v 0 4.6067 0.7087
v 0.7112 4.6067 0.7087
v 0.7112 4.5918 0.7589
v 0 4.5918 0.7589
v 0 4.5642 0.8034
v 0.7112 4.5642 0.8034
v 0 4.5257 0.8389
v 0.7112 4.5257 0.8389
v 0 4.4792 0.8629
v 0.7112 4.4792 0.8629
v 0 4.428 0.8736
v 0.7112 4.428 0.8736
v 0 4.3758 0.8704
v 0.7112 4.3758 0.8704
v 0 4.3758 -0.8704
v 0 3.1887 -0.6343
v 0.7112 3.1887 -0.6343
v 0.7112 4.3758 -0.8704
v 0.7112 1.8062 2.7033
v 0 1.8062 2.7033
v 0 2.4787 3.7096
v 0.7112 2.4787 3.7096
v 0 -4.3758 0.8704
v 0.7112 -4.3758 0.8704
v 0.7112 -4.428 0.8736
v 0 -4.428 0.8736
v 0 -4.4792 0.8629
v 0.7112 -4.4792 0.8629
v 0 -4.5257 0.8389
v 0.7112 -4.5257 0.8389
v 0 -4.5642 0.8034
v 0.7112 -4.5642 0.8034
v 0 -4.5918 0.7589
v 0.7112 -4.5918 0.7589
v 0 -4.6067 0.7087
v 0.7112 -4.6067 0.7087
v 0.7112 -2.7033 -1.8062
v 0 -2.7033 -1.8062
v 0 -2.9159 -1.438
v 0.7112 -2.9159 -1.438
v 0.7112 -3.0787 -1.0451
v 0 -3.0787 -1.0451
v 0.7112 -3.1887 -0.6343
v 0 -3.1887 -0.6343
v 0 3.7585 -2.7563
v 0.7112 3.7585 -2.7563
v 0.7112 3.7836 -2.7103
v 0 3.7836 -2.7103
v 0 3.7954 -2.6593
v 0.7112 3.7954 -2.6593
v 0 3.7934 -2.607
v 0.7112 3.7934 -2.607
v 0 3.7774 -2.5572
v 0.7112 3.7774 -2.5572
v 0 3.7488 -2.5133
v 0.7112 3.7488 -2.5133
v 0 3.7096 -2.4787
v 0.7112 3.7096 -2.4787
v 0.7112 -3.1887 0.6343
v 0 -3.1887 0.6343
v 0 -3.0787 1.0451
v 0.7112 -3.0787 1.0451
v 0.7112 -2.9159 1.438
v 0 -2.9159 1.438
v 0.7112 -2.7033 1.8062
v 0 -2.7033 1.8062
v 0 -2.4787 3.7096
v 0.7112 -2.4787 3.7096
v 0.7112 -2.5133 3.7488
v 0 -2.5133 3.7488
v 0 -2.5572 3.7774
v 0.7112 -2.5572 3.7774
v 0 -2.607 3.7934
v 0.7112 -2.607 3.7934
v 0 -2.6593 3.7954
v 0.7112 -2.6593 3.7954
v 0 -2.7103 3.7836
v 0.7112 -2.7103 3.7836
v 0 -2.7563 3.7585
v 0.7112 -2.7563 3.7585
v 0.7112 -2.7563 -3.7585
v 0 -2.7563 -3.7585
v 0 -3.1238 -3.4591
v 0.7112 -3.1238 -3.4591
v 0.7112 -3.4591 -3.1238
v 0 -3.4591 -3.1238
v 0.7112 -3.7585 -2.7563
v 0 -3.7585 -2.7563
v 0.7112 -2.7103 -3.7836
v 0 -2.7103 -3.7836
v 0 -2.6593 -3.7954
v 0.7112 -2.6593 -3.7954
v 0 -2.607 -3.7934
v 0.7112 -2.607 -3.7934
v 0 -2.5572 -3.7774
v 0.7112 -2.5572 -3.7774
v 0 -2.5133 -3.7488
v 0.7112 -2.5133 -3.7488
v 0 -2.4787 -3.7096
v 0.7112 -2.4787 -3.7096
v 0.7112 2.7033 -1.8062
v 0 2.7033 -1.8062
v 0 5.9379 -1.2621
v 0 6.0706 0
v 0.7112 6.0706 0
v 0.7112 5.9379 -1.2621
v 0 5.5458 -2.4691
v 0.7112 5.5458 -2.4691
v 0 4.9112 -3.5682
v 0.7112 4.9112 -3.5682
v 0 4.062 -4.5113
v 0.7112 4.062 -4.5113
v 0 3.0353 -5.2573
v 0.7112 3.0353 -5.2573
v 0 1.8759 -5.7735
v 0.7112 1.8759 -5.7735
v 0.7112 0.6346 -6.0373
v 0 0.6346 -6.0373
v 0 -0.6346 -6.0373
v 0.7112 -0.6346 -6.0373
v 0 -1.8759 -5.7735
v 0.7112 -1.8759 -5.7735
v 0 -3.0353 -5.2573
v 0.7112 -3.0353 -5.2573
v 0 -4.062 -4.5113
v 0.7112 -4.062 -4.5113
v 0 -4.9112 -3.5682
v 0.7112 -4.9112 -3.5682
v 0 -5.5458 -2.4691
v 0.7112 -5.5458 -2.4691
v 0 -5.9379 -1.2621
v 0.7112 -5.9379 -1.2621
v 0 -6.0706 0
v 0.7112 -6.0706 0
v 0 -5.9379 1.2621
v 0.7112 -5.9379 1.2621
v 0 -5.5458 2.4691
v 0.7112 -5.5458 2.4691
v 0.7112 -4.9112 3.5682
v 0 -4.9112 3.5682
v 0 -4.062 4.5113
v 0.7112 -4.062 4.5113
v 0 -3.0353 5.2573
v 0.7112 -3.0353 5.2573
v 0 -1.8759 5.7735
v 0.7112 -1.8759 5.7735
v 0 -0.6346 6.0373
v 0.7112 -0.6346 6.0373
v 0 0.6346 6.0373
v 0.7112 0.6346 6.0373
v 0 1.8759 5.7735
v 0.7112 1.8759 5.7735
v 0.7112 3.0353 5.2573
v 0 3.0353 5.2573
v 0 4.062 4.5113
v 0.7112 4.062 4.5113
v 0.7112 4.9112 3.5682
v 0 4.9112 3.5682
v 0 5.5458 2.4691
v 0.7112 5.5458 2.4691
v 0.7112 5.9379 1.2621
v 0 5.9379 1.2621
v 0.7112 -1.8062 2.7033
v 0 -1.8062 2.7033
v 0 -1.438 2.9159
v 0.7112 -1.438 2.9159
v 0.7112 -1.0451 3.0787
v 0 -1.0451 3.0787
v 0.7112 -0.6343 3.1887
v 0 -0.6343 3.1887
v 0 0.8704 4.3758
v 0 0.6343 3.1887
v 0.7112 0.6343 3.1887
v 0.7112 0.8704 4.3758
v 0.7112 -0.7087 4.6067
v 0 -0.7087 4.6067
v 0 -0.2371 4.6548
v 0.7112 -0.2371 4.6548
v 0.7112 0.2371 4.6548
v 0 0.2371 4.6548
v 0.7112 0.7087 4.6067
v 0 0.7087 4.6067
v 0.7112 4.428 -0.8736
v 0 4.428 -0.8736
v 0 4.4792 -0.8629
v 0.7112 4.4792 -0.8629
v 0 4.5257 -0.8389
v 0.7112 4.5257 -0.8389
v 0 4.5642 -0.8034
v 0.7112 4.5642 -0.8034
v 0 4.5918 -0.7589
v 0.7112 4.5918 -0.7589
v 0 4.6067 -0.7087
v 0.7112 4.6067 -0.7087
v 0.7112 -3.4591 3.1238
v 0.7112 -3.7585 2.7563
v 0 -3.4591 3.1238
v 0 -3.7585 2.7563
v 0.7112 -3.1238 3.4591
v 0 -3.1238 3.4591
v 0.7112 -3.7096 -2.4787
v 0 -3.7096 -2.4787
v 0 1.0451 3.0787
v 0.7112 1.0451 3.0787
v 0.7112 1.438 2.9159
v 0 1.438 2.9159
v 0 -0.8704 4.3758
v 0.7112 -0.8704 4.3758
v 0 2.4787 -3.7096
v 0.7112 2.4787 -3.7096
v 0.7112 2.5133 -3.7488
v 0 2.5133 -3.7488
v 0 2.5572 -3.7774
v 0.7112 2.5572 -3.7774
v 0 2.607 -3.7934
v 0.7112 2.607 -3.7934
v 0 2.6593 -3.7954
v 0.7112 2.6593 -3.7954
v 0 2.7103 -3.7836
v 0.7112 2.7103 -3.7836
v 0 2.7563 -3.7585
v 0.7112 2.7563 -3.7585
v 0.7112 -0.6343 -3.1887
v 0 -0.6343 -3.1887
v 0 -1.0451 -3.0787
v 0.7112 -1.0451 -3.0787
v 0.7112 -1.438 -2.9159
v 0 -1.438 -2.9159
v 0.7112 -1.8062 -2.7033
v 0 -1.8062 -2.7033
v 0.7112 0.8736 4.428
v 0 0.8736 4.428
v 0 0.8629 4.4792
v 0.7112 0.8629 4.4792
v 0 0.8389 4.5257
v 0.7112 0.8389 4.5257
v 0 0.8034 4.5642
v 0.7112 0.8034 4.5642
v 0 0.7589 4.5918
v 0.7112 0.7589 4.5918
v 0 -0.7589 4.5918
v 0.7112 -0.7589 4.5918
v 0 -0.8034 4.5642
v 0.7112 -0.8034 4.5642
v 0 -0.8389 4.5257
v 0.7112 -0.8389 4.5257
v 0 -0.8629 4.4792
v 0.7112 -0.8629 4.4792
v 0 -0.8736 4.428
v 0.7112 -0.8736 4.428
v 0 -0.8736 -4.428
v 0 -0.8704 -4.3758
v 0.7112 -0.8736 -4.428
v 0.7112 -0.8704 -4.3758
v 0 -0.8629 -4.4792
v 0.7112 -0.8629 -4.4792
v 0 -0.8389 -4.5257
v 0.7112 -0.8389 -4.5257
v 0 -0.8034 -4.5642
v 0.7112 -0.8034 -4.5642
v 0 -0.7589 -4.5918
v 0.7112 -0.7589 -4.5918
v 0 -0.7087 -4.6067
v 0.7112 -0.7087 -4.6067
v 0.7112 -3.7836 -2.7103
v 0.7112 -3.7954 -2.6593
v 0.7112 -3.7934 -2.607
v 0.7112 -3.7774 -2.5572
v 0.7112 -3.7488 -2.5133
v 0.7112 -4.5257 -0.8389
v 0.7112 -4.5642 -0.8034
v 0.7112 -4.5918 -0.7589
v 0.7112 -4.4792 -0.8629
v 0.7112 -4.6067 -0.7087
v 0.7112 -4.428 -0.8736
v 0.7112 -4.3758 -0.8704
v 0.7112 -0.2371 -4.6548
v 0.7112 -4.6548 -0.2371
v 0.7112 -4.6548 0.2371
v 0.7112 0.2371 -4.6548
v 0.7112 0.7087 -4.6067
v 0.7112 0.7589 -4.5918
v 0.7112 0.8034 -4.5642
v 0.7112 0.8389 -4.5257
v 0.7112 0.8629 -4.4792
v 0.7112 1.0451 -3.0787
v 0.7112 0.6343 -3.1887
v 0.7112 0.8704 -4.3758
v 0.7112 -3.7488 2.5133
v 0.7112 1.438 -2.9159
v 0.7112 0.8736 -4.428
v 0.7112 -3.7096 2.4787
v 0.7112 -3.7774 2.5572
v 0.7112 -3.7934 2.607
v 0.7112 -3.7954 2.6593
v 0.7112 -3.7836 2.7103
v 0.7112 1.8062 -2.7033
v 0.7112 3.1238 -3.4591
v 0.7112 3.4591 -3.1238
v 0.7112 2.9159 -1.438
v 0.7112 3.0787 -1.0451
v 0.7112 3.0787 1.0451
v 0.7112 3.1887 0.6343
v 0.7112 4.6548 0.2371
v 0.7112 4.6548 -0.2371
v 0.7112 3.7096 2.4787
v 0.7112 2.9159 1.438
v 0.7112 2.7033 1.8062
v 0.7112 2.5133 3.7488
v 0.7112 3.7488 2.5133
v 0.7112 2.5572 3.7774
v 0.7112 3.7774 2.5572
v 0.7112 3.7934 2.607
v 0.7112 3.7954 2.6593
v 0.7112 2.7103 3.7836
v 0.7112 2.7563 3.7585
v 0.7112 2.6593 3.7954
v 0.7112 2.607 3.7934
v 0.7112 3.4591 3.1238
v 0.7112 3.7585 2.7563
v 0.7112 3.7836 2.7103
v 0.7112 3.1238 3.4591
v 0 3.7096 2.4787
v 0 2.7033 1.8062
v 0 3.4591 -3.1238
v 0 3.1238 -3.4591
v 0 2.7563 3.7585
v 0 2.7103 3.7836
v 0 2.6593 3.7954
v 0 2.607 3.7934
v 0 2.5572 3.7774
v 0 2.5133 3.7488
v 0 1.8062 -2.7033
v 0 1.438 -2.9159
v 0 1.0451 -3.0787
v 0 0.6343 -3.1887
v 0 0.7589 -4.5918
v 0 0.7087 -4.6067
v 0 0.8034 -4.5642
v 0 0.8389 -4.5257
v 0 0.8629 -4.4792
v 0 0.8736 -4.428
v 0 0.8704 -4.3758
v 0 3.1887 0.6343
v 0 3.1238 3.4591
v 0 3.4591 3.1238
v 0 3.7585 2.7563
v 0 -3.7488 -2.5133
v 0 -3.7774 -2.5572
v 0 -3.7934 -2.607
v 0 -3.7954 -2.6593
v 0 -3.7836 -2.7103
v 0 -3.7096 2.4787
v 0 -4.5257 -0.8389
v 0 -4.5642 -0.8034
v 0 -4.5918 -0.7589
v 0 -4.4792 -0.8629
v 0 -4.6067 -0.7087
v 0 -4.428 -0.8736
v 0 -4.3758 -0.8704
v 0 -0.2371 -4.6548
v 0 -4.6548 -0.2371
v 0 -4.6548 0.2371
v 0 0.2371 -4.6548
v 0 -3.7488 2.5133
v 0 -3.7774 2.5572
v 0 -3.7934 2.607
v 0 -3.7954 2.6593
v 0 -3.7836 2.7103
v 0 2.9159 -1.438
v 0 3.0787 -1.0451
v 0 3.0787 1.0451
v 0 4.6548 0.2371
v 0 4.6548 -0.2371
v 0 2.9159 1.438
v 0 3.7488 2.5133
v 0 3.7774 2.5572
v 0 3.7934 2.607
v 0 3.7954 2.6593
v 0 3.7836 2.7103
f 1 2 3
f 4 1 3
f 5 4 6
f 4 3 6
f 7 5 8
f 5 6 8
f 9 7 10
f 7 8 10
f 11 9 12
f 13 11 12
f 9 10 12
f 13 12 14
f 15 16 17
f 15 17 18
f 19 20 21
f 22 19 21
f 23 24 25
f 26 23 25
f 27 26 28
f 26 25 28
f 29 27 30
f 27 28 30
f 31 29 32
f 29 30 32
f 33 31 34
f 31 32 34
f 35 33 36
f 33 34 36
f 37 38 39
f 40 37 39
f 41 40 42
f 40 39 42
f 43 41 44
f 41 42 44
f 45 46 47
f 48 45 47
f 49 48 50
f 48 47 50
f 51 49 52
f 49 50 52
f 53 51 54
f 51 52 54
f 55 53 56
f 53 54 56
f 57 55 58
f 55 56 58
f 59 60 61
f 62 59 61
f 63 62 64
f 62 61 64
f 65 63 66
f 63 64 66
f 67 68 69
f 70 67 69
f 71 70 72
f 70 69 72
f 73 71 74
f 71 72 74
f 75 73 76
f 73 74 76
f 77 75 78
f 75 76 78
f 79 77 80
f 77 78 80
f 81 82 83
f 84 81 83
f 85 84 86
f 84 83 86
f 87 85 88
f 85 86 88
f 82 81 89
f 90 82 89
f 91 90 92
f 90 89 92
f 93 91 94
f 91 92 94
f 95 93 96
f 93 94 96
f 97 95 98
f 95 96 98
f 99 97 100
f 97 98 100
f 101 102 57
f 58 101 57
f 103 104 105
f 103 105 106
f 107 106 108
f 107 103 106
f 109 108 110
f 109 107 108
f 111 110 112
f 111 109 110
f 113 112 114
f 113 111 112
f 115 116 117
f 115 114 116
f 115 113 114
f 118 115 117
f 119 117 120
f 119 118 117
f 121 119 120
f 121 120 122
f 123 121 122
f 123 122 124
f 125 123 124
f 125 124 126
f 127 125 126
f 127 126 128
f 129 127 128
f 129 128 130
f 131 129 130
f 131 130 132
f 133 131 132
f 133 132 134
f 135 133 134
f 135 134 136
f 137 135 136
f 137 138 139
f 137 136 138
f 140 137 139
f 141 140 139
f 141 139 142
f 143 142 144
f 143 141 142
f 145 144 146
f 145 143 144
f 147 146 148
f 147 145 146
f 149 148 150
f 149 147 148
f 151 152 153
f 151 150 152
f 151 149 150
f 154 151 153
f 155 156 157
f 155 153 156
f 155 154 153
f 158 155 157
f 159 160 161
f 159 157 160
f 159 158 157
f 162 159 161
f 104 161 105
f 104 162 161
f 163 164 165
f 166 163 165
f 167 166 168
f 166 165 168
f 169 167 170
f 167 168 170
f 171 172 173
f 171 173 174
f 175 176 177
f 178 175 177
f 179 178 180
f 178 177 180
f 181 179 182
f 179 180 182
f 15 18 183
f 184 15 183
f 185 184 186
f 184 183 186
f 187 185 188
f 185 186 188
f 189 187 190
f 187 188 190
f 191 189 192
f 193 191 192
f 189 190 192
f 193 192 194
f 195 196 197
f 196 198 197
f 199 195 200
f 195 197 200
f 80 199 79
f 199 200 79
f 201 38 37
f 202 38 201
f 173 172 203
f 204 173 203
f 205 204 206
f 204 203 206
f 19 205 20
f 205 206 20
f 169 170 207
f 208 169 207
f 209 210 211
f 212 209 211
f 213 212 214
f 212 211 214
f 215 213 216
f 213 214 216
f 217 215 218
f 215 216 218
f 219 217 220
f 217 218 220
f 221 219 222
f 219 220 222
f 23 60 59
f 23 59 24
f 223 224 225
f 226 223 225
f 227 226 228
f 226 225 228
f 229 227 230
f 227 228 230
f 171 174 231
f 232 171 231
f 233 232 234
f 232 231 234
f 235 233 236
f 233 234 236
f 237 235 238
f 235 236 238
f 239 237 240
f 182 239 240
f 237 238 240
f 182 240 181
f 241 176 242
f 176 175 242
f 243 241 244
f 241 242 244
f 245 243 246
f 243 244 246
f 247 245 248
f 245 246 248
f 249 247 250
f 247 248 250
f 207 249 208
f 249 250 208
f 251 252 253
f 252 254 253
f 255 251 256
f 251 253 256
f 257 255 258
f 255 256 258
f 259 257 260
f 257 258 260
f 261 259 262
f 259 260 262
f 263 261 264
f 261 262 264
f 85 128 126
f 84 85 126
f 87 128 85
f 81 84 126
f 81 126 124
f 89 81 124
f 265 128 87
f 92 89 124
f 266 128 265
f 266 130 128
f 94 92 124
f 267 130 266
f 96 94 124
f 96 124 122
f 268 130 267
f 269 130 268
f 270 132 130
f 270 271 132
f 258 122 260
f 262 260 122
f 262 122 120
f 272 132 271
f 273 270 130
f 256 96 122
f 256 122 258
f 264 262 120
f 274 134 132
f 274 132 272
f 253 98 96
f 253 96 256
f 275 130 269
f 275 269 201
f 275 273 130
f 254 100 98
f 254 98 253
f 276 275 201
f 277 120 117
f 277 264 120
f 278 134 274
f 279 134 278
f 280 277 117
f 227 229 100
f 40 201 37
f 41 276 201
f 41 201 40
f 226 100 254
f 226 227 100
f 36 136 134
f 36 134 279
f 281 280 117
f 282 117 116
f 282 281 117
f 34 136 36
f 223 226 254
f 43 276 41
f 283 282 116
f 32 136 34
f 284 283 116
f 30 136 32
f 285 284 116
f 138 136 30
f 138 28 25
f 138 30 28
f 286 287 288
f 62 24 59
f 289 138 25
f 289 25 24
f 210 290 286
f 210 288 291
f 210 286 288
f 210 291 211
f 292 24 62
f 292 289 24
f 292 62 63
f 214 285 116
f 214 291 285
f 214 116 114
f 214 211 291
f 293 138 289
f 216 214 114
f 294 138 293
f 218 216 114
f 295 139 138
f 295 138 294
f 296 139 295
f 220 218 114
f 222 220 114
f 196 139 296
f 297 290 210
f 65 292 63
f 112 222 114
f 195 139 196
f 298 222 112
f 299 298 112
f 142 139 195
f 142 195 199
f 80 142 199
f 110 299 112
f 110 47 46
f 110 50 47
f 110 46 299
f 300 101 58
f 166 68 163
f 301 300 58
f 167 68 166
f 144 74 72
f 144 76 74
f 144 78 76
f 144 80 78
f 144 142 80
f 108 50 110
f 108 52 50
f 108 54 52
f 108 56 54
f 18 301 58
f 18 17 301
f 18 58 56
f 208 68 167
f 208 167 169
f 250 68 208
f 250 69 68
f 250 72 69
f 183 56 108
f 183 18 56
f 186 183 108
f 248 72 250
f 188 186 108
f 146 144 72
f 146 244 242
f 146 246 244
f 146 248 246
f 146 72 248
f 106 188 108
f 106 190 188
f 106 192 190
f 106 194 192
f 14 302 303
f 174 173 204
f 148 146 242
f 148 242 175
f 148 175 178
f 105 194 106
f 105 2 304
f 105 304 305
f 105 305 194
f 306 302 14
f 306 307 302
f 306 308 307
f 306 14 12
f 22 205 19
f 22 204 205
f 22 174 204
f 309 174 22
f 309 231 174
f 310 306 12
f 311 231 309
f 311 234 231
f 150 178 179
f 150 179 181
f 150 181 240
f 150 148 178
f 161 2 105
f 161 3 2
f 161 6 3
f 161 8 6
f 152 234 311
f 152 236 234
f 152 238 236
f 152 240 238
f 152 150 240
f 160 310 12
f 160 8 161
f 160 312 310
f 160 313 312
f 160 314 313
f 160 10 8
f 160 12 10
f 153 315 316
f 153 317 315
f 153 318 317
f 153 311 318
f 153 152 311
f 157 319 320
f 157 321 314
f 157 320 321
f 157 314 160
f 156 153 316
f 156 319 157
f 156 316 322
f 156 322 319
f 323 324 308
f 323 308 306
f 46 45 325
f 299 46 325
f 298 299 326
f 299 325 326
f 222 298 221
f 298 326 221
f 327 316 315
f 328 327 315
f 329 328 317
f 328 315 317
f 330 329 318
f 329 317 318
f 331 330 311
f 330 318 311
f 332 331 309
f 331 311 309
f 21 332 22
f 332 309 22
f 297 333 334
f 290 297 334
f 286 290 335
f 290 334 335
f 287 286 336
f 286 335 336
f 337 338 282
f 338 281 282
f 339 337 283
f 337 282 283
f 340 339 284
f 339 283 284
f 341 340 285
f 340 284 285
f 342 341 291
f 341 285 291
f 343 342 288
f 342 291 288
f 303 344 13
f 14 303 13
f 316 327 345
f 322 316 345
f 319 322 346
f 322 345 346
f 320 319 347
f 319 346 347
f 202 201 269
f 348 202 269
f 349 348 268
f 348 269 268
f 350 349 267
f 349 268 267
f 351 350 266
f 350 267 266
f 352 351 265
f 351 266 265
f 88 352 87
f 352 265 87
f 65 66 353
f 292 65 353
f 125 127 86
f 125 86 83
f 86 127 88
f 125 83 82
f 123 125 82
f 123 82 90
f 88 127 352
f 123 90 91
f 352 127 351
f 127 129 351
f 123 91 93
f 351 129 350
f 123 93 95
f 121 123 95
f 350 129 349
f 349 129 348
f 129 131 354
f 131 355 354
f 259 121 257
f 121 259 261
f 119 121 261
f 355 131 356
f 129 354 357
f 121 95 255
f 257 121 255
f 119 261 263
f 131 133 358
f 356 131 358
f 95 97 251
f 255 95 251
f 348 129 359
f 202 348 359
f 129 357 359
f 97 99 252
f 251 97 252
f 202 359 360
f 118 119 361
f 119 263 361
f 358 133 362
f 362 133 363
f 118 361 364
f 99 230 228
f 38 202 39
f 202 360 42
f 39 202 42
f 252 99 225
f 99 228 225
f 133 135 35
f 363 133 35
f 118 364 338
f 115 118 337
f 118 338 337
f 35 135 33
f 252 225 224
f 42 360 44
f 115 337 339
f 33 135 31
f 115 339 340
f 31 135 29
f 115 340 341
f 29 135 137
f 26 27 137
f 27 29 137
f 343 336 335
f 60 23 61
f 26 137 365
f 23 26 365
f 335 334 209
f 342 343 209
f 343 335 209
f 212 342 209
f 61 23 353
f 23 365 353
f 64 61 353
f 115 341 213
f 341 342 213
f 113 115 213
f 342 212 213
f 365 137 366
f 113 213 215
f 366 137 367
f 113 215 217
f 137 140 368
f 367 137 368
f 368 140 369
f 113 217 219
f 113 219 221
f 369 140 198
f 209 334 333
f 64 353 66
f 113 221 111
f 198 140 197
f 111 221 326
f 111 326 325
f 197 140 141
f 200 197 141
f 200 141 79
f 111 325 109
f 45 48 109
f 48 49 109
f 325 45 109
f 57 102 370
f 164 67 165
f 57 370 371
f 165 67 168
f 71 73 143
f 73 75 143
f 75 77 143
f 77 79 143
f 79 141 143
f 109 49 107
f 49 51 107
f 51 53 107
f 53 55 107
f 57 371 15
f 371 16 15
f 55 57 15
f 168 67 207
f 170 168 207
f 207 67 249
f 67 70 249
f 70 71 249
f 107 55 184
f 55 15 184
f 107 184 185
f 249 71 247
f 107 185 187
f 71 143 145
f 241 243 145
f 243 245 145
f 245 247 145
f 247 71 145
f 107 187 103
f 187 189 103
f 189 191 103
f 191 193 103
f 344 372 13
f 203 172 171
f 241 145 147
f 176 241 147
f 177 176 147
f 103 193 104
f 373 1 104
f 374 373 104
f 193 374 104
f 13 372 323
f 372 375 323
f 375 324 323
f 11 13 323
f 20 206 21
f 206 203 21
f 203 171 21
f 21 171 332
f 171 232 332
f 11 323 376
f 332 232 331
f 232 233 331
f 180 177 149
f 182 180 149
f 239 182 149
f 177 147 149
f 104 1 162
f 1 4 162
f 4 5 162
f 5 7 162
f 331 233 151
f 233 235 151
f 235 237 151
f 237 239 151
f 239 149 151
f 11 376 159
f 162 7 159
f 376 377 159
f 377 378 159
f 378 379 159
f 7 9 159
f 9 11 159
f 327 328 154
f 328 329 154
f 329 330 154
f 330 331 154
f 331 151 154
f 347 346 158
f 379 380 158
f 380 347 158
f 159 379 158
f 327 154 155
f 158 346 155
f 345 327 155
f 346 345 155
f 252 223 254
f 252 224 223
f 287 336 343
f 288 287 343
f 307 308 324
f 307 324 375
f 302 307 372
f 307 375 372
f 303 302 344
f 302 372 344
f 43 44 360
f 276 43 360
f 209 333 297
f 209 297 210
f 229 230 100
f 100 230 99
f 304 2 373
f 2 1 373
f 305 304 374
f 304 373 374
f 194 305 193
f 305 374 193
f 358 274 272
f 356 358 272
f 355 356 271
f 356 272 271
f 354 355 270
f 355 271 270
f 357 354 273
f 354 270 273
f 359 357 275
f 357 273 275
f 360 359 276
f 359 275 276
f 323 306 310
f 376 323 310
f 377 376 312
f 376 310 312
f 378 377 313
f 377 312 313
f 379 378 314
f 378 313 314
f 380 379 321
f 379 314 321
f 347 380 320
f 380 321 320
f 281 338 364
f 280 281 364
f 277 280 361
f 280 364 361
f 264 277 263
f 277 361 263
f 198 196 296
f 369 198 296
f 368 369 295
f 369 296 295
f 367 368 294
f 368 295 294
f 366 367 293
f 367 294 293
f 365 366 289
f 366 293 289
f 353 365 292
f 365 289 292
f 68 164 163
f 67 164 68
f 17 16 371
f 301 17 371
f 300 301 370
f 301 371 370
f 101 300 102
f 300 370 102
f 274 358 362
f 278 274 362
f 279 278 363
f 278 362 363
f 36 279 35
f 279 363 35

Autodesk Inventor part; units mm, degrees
ref_plane "YZ Plane" through (0, 0, 0) normal (1, 0, 0) x (0, 1, 0)
ref_plane "XZ Plane" through (0, 0, 0) normal (0, 1, 0) x (-1, 0, 0)
sketch "Sketch1" plane through (0, 0, 0) normal (1, 0, 0) x (0, 1, 0)
  circle A0 centre (0, 0) radius 6.0706
  circle A1 centre (0, 0) radius 3.2512
  dimension "d0" = 12.1412
  dimension "d1" = 6.5024
extrude "Body" add sketch "Sketch1" along normal blind 0.7112
sketch "Sketch2" plane through (0, 0, 0) normal (-1, 0, 0) x (0, 0, 1)
  circle A0 centre (0, 0) radius 3.2512 projected
  circle A1 centre (0, 0) radius 6.0706 projected
  arc A2 (0.9093, 4.5713) -> (-0.9093, 4.5713) centre (0, 0) ccw
  line L0 (-0.6343, 3.1887) -> (-0.9093, 4.5713)
  line L1 (0, 0) -> (0, 4.6609) construction
  line L2 (0.6343, 3.1887) -> (0.9093, 4.5713)
  line L3 (-0.6343, 3.1887) -> (0, 0) construction
  line L4 (0.6343, 3.1887) -> (0, 0) construction
  dimension "d4" = 9.3218
  dimension "d5" = 11.25
extrude "Cut" cut sketch "Sketch2" against normal blind 0.7112 contours A0 L0 A2 L2
fillet "Fillet1" radius 0.1951 2 edges at (0.3556, 4.5713, 0.9093) (0.3556, 4.5713, -0.9093)
pattern_circular "Cuts" count 8 over 360 about axis through (-10, 0, 0) along (1, 0, 0) of "Cut", "Fillet1"
ref_plane "Work Plane1" through (0, 0, 0) normal (0, 1, 0) x (1, 0, 0)
equation "\"d0\" = SD2"
equation "\"d1\" = SD1"
equation "\"d2\" = SD"
equation "\"d4\" = 0.5 * SD2 + 0.5 * SD1"
equation "\"d6\" = SD"
equation "\"d8\" = 0.03 * SD1"
equation "\"SD1\" = 6.5024"
equation "\"SD2\" = 12.1412"
equation "\"SD\" = 0.7112"
equation "\"NND\" = 6.35"
properties part number "ASME B18.21.1 - 1/4. Carbon Steel" material "Steel, Mild"
